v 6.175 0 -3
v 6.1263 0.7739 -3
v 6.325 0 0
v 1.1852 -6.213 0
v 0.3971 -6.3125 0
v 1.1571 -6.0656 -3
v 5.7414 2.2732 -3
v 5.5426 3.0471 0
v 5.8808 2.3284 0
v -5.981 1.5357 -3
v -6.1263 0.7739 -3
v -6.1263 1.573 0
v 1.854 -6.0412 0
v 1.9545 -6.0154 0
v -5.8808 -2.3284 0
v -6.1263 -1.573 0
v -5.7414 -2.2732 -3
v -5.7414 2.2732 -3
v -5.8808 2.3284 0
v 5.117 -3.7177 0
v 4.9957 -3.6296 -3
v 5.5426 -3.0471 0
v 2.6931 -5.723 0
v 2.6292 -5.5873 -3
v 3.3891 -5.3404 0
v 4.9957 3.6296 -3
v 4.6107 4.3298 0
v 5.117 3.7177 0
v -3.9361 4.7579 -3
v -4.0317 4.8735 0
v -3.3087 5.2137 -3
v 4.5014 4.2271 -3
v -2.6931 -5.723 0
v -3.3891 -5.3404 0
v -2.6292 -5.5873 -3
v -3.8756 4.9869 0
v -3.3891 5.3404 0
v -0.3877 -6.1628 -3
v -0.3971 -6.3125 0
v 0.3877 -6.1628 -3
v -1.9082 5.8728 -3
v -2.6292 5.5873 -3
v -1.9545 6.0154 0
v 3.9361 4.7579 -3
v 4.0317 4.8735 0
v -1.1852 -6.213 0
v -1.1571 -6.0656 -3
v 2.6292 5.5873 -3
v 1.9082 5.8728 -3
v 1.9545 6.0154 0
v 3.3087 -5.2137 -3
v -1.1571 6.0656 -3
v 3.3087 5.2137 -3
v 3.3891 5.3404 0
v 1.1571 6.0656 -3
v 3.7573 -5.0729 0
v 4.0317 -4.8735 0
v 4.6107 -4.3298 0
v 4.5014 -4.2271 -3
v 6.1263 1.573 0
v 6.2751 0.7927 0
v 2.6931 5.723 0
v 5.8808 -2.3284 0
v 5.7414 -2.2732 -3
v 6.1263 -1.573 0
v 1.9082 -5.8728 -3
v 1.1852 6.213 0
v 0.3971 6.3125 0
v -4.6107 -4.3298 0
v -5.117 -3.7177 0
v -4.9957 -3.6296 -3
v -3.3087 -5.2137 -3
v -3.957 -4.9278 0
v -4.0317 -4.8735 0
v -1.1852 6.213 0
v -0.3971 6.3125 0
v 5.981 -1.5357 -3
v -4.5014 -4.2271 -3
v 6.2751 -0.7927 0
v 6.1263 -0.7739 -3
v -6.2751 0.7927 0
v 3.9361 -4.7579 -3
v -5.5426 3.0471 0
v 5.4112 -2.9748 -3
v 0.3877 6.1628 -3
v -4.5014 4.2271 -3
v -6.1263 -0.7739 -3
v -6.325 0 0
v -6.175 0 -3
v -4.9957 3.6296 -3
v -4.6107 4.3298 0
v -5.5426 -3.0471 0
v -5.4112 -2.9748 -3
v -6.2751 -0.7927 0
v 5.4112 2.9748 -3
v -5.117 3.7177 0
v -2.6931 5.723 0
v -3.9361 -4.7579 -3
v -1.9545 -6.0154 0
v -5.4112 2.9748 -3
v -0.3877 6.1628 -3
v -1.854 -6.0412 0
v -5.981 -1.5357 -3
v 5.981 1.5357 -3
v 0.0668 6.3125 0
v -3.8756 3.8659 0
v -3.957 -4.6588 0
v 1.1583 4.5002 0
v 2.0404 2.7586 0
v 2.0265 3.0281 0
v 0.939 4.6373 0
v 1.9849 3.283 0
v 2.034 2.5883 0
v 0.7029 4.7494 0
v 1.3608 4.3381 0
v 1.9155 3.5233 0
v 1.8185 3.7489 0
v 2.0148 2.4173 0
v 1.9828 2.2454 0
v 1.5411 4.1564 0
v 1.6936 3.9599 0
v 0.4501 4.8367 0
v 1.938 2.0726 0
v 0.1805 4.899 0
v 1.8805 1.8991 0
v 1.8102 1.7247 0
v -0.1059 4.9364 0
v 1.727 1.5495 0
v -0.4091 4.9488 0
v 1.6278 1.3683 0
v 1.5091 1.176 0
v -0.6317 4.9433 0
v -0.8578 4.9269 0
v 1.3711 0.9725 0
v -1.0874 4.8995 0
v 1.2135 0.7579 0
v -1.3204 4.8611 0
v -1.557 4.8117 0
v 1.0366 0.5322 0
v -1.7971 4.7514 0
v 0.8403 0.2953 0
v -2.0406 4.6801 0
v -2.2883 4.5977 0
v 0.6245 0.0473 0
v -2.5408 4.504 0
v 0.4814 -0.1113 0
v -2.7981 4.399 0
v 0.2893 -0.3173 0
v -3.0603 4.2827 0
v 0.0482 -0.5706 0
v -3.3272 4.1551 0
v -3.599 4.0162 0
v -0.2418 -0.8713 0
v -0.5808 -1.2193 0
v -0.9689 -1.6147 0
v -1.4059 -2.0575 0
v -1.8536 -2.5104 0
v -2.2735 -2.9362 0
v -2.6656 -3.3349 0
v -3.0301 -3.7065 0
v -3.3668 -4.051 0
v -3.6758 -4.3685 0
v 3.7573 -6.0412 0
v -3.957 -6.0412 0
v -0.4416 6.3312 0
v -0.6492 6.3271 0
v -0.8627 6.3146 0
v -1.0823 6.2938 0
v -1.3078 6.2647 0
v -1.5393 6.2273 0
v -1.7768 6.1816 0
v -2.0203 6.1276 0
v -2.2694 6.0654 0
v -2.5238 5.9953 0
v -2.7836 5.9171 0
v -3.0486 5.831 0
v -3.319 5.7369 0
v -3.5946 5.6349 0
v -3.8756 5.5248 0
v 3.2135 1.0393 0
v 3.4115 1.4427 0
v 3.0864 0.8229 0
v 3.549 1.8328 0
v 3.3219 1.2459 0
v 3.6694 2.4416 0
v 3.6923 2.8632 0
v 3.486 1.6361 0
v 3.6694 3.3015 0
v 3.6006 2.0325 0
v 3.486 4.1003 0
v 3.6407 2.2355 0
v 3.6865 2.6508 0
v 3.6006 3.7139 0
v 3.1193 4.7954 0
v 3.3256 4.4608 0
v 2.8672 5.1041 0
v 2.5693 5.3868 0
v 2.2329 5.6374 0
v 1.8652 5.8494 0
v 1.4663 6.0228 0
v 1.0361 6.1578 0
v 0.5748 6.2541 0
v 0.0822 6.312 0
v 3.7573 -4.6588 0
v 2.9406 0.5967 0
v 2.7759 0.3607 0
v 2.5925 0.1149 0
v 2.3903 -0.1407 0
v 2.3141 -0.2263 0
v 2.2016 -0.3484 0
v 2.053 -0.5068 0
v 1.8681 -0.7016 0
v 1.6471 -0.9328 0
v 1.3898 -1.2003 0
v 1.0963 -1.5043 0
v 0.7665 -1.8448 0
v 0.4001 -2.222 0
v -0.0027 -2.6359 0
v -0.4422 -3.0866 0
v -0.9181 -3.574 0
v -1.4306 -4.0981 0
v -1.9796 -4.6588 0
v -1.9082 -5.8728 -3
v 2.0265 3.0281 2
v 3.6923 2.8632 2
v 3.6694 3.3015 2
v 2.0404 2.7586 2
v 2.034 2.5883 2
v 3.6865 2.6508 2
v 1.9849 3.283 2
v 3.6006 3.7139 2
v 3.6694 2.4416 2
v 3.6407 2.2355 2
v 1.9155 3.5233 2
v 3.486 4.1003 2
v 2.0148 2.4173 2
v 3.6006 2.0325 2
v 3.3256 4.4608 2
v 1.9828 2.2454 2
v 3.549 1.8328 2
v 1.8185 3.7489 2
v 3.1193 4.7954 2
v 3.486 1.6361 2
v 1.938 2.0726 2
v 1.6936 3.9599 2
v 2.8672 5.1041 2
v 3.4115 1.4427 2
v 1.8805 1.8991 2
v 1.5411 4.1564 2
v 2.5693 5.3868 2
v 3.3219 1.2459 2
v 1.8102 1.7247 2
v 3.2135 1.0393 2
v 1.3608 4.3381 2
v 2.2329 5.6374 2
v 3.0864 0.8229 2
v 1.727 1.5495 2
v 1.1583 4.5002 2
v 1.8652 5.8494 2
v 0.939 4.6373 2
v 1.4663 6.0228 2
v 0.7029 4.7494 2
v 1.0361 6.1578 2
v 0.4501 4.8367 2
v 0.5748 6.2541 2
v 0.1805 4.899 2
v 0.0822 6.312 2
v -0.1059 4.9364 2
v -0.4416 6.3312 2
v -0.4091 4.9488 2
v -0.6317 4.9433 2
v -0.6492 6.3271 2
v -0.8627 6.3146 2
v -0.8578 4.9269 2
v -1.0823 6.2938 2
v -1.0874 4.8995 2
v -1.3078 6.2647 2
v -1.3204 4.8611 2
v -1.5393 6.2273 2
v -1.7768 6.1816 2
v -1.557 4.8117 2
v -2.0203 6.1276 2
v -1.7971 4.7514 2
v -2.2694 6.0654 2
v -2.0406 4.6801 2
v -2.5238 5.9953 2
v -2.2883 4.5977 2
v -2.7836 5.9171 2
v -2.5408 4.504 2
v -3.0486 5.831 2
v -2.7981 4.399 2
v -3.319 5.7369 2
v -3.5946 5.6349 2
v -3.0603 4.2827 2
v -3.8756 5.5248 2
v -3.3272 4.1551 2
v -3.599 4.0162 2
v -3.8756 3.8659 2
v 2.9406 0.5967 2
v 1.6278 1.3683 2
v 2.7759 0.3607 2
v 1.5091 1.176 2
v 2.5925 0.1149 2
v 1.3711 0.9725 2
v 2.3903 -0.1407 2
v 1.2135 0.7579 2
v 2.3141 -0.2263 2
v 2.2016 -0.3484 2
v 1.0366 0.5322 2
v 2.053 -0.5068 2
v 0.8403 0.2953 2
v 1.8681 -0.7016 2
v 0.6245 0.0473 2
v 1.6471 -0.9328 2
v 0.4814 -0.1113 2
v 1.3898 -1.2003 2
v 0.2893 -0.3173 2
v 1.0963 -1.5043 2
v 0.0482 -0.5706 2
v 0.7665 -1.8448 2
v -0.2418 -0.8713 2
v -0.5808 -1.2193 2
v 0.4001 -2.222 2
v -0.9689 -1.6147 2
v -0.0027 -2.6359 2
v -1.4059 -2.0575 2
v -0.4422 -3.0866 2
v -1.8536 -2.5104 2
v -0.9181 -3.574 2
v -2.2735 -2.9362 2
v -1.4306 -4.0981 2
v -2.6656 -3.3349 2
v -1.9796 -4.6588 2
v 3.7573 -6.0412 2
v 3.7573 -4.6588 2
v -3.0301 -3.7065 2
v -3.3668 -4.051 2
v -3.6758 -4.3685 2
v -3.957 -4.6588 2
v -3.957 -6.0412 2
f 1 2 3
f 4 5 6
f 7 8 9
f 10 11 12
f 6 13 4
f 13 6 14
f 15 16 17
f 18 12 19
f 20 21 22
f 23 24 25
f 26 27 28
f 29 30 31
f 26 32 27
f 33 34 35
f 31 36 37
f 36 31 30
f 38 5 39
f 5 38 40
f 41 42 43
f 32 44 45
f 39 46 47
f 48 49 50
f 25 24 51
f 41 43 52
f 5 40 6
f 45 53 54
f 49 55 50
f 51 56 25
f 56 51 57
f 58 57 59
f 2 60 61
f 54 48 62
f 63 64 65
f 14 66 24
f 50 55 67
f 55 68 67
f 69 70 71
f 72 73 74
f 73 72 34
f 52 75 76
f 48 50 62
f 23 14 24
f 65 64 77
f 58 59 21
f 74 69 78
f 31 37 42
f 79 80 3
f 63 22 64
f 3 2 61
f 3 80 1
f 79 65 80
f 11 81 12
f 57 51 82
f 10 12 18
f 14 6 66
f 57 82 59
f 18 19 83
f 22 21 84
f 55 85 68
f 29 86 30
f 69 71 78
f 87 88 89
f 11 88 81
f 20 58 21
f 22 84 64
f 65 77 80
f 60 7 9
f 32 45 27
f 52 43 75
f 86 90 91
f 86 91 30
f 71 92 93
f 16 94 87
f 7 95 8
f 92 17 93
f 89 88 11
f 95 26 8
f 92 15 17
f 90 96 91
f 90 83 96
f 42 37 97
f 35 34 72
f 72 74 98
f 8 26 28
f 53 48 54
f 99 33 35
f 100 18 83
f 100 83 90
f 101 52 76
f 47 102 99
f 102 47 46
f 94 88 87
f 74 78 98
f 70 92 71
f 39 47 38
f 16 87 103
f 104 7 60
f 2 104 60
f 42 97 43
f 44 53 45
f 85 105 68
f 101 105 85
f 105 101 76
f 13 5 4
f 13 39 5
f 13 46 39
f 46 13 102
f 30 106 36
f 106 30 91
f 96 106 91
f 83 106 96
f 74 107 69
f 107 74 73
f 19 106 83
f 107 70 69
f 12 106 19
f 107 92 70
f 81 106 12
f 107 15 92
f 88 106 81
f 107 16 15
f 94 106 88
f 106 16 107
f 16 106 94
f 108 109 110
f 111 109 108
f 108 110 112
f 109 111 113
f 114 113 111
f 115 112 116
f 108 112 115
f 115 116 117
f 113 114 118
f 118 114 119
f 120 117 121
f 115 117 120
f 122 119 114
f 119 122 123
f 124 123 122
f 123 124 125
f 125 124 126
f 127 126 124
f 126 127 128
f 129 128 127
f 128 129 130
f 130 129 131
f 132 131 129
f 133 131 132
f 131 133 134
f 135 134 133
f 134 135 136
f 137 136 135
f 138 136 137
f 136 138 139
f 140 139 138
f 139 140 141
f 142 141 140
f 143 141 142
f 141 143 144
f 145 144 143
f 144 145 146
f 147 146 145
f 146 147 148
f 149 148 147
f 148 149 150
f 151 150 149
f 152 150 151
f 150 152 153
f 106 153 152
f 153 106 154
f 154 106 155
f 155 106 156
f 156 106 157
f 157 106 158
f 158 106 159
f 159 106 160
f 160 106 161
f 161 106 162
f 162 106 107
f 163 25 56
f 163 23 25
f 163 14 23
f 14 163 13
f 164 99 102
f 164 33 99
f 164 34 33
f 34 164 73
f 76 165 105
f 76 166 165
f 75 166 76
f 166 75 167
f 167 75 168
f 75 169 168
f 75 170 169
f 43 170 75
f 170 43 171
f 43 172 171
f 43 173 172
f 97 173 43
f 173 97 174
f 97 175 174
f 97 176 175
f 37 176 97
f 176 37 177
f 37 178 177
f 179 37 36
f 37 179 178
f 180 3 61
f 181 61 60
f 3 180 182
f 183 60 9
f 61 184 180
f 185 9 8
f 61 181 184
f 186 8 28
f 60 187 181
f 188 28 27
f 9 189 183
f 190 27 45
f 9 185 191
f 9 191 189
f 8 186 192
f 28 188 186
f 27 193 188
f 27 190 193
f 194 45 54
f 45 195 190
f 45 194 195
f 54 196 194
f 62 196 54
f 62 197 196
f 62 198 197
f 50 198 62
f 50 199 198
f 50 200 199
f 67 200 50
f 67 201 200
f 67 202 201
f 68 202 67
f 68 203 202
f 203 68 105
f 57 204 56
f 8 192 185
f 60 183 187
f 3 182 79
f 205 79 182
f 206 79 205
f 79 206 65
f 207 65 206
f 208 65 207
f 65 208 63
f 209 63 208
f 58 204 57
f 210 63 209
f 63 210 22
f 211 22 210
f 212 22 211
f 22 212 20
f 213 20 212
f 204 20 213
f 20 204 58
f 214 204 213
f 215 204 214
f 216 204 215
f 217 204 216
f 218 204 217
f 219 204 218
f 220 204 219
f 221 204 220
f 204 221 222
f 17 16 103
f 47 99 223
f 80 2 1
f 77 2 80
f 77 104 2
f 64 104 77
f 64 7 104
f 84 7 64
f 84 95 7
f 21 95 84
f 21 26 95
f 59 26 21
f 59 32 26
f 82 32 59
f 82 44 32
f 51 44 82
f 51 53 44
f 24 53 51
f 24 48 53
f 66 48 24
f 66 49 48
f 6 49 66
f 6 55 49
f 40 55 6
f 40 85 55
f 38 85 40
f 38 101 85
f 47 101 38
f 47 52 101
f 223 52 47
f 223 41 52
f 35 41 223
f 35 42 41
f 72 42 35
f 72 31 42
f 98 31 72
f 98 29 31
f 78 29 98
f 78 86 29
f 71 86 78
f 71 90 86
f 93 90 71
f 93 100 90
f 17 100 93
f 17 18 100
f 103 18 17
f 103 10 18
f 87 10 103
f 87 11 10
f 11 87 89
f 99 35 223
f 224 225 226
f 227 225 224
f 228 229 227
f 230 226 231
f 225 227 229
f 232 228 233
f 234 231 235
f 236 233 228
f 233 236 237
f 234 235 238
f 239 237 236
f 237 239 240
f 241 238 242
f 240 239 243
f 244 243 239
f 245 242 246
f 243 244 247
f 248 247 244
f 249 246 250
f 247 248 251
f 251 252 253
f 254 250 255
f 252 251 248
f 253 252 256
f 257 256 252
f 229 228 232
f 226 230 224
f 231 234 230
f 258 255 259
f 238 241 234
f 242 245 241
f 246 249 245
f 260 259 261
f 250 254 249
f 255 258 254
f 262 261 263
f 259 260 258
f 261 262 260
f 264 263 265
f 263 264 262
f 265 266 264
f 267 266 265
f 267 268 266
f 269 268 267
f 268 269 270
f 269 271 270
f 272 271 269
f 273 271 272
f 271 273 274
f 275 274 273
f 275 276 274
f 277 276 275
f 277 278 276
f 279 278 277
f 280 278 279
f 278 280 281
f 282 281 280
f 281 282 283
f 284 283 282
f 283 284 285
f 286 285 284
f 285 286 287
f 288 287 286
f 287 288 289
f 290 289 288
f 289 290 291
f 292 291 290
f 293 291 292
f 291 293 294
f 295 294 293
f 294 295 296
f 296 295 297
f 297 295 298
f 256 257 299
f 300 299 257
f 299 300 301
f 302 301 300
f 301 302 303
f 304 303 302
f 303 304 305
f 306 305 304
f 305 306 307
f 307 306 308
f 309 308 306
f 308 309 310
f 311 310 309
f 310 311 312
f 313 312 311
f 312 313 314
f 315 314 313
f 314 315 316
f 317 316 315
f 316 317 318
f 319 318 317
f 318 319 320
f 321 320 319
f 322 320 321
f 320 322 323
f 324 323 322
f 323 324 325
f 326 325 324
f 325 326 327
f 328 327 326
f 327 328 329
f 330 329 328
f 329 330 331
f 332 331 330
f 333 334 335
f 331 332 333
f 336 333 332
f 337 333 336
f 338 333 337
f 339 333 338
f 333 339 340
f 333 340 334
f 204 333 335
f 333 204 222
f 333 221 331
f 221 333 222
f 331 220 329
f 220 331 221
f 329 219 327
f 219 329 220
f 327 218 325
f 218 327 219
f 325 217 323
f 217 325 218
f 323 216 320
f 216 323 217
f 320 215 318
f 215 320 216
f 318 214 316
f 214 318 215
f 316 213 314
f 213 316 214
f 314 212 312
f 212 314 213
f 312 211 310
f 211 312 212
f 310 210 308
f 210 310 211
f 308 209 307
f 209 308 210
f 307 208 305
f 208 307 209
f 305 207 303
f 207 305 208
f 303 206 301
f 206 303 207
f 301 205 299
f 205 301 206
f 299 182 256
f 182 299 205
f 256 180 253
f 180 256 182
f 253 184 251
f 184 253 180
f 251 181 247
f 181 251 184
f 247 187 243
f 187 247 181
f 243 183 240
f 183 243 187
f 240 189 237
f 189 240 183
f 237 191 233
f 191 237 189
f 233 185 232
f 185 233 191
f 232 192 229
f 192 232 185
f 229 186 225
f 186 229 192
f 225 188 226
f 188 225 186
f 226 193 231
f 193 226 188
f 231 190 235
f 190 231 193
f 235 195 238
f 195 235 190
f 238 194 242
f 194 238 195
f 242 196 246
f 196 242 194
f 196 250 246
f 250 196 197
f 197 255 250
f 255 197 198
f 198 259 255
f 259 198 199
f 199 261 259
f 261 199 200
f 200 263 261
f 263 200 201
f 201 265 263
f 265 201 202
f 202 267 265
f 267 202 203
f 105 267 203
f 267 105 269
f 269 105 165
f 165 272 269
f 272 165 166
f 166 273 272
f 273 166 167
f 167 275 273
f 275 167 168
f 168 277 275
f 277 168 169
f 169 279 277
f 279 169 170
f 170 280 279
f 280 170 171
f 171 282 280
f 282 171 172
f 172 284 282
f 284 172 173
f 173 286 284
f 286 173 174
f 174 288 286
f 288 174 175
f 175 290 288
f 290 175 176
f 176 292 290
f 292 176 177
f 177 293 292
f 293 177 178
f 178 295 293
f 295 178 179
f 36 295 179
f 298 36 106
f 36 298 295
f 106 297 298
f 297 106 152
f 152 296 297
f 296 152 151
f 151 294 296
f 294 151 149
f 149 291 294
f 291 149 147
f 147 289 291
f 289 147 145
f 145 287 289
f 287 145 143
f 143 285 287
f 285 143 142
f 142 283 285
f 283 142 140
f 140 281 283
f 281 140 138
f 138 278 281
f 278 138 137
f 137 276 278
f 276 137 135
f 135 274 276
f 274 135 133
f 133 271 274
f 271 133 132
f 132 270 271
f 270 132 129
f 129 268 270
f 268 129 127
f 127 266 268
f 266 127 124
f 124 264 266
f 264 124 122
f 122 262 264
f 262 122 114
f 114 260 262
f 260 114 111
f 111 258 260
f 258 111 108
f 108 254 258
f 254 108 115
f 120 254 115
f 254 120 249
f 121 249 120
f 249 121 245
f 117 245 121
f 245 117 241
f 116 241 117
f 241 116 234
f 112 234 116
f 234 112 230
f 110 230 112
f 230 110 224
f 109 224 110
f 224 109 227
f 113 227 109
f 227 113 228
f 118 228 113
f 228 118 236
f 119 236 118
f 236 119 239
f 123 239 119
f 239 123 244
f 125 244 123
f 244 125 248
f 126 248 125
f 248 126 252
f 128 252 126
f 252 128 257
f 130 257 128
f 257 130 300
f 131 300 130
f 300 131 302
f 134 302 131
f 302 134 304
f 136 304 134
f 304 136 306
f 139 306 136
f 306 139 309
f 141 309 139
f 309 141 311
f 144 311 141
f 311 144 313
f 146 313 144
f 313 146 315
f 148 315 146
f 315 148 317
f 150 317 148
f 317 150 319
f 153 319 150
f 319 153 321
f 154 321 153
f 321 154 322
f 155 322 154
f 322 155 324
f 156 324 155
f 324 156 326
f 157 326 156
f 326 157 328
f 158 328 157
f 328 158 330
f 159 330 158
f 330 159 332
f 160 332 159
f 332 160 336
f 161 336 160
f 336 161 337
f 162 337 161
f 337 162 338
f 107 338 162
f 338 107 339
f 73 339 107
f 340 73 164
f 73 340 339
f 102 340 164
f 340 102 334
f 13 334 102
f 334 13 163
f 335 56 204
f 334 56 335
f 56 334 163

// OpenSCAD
$fn = 50;


difference() {
	union() {
		translate(v = [0, 0, -3.0000000000]) {
			cylinder(h = 3, r1 = 6.1750000000, r2 = 6.3250000000);
		}
		linear_extrude(height = 2) {
			text(font = "Impact", halign = "center", size = 12, text = "2", valign = "center");
		}
	}
	union();
}
